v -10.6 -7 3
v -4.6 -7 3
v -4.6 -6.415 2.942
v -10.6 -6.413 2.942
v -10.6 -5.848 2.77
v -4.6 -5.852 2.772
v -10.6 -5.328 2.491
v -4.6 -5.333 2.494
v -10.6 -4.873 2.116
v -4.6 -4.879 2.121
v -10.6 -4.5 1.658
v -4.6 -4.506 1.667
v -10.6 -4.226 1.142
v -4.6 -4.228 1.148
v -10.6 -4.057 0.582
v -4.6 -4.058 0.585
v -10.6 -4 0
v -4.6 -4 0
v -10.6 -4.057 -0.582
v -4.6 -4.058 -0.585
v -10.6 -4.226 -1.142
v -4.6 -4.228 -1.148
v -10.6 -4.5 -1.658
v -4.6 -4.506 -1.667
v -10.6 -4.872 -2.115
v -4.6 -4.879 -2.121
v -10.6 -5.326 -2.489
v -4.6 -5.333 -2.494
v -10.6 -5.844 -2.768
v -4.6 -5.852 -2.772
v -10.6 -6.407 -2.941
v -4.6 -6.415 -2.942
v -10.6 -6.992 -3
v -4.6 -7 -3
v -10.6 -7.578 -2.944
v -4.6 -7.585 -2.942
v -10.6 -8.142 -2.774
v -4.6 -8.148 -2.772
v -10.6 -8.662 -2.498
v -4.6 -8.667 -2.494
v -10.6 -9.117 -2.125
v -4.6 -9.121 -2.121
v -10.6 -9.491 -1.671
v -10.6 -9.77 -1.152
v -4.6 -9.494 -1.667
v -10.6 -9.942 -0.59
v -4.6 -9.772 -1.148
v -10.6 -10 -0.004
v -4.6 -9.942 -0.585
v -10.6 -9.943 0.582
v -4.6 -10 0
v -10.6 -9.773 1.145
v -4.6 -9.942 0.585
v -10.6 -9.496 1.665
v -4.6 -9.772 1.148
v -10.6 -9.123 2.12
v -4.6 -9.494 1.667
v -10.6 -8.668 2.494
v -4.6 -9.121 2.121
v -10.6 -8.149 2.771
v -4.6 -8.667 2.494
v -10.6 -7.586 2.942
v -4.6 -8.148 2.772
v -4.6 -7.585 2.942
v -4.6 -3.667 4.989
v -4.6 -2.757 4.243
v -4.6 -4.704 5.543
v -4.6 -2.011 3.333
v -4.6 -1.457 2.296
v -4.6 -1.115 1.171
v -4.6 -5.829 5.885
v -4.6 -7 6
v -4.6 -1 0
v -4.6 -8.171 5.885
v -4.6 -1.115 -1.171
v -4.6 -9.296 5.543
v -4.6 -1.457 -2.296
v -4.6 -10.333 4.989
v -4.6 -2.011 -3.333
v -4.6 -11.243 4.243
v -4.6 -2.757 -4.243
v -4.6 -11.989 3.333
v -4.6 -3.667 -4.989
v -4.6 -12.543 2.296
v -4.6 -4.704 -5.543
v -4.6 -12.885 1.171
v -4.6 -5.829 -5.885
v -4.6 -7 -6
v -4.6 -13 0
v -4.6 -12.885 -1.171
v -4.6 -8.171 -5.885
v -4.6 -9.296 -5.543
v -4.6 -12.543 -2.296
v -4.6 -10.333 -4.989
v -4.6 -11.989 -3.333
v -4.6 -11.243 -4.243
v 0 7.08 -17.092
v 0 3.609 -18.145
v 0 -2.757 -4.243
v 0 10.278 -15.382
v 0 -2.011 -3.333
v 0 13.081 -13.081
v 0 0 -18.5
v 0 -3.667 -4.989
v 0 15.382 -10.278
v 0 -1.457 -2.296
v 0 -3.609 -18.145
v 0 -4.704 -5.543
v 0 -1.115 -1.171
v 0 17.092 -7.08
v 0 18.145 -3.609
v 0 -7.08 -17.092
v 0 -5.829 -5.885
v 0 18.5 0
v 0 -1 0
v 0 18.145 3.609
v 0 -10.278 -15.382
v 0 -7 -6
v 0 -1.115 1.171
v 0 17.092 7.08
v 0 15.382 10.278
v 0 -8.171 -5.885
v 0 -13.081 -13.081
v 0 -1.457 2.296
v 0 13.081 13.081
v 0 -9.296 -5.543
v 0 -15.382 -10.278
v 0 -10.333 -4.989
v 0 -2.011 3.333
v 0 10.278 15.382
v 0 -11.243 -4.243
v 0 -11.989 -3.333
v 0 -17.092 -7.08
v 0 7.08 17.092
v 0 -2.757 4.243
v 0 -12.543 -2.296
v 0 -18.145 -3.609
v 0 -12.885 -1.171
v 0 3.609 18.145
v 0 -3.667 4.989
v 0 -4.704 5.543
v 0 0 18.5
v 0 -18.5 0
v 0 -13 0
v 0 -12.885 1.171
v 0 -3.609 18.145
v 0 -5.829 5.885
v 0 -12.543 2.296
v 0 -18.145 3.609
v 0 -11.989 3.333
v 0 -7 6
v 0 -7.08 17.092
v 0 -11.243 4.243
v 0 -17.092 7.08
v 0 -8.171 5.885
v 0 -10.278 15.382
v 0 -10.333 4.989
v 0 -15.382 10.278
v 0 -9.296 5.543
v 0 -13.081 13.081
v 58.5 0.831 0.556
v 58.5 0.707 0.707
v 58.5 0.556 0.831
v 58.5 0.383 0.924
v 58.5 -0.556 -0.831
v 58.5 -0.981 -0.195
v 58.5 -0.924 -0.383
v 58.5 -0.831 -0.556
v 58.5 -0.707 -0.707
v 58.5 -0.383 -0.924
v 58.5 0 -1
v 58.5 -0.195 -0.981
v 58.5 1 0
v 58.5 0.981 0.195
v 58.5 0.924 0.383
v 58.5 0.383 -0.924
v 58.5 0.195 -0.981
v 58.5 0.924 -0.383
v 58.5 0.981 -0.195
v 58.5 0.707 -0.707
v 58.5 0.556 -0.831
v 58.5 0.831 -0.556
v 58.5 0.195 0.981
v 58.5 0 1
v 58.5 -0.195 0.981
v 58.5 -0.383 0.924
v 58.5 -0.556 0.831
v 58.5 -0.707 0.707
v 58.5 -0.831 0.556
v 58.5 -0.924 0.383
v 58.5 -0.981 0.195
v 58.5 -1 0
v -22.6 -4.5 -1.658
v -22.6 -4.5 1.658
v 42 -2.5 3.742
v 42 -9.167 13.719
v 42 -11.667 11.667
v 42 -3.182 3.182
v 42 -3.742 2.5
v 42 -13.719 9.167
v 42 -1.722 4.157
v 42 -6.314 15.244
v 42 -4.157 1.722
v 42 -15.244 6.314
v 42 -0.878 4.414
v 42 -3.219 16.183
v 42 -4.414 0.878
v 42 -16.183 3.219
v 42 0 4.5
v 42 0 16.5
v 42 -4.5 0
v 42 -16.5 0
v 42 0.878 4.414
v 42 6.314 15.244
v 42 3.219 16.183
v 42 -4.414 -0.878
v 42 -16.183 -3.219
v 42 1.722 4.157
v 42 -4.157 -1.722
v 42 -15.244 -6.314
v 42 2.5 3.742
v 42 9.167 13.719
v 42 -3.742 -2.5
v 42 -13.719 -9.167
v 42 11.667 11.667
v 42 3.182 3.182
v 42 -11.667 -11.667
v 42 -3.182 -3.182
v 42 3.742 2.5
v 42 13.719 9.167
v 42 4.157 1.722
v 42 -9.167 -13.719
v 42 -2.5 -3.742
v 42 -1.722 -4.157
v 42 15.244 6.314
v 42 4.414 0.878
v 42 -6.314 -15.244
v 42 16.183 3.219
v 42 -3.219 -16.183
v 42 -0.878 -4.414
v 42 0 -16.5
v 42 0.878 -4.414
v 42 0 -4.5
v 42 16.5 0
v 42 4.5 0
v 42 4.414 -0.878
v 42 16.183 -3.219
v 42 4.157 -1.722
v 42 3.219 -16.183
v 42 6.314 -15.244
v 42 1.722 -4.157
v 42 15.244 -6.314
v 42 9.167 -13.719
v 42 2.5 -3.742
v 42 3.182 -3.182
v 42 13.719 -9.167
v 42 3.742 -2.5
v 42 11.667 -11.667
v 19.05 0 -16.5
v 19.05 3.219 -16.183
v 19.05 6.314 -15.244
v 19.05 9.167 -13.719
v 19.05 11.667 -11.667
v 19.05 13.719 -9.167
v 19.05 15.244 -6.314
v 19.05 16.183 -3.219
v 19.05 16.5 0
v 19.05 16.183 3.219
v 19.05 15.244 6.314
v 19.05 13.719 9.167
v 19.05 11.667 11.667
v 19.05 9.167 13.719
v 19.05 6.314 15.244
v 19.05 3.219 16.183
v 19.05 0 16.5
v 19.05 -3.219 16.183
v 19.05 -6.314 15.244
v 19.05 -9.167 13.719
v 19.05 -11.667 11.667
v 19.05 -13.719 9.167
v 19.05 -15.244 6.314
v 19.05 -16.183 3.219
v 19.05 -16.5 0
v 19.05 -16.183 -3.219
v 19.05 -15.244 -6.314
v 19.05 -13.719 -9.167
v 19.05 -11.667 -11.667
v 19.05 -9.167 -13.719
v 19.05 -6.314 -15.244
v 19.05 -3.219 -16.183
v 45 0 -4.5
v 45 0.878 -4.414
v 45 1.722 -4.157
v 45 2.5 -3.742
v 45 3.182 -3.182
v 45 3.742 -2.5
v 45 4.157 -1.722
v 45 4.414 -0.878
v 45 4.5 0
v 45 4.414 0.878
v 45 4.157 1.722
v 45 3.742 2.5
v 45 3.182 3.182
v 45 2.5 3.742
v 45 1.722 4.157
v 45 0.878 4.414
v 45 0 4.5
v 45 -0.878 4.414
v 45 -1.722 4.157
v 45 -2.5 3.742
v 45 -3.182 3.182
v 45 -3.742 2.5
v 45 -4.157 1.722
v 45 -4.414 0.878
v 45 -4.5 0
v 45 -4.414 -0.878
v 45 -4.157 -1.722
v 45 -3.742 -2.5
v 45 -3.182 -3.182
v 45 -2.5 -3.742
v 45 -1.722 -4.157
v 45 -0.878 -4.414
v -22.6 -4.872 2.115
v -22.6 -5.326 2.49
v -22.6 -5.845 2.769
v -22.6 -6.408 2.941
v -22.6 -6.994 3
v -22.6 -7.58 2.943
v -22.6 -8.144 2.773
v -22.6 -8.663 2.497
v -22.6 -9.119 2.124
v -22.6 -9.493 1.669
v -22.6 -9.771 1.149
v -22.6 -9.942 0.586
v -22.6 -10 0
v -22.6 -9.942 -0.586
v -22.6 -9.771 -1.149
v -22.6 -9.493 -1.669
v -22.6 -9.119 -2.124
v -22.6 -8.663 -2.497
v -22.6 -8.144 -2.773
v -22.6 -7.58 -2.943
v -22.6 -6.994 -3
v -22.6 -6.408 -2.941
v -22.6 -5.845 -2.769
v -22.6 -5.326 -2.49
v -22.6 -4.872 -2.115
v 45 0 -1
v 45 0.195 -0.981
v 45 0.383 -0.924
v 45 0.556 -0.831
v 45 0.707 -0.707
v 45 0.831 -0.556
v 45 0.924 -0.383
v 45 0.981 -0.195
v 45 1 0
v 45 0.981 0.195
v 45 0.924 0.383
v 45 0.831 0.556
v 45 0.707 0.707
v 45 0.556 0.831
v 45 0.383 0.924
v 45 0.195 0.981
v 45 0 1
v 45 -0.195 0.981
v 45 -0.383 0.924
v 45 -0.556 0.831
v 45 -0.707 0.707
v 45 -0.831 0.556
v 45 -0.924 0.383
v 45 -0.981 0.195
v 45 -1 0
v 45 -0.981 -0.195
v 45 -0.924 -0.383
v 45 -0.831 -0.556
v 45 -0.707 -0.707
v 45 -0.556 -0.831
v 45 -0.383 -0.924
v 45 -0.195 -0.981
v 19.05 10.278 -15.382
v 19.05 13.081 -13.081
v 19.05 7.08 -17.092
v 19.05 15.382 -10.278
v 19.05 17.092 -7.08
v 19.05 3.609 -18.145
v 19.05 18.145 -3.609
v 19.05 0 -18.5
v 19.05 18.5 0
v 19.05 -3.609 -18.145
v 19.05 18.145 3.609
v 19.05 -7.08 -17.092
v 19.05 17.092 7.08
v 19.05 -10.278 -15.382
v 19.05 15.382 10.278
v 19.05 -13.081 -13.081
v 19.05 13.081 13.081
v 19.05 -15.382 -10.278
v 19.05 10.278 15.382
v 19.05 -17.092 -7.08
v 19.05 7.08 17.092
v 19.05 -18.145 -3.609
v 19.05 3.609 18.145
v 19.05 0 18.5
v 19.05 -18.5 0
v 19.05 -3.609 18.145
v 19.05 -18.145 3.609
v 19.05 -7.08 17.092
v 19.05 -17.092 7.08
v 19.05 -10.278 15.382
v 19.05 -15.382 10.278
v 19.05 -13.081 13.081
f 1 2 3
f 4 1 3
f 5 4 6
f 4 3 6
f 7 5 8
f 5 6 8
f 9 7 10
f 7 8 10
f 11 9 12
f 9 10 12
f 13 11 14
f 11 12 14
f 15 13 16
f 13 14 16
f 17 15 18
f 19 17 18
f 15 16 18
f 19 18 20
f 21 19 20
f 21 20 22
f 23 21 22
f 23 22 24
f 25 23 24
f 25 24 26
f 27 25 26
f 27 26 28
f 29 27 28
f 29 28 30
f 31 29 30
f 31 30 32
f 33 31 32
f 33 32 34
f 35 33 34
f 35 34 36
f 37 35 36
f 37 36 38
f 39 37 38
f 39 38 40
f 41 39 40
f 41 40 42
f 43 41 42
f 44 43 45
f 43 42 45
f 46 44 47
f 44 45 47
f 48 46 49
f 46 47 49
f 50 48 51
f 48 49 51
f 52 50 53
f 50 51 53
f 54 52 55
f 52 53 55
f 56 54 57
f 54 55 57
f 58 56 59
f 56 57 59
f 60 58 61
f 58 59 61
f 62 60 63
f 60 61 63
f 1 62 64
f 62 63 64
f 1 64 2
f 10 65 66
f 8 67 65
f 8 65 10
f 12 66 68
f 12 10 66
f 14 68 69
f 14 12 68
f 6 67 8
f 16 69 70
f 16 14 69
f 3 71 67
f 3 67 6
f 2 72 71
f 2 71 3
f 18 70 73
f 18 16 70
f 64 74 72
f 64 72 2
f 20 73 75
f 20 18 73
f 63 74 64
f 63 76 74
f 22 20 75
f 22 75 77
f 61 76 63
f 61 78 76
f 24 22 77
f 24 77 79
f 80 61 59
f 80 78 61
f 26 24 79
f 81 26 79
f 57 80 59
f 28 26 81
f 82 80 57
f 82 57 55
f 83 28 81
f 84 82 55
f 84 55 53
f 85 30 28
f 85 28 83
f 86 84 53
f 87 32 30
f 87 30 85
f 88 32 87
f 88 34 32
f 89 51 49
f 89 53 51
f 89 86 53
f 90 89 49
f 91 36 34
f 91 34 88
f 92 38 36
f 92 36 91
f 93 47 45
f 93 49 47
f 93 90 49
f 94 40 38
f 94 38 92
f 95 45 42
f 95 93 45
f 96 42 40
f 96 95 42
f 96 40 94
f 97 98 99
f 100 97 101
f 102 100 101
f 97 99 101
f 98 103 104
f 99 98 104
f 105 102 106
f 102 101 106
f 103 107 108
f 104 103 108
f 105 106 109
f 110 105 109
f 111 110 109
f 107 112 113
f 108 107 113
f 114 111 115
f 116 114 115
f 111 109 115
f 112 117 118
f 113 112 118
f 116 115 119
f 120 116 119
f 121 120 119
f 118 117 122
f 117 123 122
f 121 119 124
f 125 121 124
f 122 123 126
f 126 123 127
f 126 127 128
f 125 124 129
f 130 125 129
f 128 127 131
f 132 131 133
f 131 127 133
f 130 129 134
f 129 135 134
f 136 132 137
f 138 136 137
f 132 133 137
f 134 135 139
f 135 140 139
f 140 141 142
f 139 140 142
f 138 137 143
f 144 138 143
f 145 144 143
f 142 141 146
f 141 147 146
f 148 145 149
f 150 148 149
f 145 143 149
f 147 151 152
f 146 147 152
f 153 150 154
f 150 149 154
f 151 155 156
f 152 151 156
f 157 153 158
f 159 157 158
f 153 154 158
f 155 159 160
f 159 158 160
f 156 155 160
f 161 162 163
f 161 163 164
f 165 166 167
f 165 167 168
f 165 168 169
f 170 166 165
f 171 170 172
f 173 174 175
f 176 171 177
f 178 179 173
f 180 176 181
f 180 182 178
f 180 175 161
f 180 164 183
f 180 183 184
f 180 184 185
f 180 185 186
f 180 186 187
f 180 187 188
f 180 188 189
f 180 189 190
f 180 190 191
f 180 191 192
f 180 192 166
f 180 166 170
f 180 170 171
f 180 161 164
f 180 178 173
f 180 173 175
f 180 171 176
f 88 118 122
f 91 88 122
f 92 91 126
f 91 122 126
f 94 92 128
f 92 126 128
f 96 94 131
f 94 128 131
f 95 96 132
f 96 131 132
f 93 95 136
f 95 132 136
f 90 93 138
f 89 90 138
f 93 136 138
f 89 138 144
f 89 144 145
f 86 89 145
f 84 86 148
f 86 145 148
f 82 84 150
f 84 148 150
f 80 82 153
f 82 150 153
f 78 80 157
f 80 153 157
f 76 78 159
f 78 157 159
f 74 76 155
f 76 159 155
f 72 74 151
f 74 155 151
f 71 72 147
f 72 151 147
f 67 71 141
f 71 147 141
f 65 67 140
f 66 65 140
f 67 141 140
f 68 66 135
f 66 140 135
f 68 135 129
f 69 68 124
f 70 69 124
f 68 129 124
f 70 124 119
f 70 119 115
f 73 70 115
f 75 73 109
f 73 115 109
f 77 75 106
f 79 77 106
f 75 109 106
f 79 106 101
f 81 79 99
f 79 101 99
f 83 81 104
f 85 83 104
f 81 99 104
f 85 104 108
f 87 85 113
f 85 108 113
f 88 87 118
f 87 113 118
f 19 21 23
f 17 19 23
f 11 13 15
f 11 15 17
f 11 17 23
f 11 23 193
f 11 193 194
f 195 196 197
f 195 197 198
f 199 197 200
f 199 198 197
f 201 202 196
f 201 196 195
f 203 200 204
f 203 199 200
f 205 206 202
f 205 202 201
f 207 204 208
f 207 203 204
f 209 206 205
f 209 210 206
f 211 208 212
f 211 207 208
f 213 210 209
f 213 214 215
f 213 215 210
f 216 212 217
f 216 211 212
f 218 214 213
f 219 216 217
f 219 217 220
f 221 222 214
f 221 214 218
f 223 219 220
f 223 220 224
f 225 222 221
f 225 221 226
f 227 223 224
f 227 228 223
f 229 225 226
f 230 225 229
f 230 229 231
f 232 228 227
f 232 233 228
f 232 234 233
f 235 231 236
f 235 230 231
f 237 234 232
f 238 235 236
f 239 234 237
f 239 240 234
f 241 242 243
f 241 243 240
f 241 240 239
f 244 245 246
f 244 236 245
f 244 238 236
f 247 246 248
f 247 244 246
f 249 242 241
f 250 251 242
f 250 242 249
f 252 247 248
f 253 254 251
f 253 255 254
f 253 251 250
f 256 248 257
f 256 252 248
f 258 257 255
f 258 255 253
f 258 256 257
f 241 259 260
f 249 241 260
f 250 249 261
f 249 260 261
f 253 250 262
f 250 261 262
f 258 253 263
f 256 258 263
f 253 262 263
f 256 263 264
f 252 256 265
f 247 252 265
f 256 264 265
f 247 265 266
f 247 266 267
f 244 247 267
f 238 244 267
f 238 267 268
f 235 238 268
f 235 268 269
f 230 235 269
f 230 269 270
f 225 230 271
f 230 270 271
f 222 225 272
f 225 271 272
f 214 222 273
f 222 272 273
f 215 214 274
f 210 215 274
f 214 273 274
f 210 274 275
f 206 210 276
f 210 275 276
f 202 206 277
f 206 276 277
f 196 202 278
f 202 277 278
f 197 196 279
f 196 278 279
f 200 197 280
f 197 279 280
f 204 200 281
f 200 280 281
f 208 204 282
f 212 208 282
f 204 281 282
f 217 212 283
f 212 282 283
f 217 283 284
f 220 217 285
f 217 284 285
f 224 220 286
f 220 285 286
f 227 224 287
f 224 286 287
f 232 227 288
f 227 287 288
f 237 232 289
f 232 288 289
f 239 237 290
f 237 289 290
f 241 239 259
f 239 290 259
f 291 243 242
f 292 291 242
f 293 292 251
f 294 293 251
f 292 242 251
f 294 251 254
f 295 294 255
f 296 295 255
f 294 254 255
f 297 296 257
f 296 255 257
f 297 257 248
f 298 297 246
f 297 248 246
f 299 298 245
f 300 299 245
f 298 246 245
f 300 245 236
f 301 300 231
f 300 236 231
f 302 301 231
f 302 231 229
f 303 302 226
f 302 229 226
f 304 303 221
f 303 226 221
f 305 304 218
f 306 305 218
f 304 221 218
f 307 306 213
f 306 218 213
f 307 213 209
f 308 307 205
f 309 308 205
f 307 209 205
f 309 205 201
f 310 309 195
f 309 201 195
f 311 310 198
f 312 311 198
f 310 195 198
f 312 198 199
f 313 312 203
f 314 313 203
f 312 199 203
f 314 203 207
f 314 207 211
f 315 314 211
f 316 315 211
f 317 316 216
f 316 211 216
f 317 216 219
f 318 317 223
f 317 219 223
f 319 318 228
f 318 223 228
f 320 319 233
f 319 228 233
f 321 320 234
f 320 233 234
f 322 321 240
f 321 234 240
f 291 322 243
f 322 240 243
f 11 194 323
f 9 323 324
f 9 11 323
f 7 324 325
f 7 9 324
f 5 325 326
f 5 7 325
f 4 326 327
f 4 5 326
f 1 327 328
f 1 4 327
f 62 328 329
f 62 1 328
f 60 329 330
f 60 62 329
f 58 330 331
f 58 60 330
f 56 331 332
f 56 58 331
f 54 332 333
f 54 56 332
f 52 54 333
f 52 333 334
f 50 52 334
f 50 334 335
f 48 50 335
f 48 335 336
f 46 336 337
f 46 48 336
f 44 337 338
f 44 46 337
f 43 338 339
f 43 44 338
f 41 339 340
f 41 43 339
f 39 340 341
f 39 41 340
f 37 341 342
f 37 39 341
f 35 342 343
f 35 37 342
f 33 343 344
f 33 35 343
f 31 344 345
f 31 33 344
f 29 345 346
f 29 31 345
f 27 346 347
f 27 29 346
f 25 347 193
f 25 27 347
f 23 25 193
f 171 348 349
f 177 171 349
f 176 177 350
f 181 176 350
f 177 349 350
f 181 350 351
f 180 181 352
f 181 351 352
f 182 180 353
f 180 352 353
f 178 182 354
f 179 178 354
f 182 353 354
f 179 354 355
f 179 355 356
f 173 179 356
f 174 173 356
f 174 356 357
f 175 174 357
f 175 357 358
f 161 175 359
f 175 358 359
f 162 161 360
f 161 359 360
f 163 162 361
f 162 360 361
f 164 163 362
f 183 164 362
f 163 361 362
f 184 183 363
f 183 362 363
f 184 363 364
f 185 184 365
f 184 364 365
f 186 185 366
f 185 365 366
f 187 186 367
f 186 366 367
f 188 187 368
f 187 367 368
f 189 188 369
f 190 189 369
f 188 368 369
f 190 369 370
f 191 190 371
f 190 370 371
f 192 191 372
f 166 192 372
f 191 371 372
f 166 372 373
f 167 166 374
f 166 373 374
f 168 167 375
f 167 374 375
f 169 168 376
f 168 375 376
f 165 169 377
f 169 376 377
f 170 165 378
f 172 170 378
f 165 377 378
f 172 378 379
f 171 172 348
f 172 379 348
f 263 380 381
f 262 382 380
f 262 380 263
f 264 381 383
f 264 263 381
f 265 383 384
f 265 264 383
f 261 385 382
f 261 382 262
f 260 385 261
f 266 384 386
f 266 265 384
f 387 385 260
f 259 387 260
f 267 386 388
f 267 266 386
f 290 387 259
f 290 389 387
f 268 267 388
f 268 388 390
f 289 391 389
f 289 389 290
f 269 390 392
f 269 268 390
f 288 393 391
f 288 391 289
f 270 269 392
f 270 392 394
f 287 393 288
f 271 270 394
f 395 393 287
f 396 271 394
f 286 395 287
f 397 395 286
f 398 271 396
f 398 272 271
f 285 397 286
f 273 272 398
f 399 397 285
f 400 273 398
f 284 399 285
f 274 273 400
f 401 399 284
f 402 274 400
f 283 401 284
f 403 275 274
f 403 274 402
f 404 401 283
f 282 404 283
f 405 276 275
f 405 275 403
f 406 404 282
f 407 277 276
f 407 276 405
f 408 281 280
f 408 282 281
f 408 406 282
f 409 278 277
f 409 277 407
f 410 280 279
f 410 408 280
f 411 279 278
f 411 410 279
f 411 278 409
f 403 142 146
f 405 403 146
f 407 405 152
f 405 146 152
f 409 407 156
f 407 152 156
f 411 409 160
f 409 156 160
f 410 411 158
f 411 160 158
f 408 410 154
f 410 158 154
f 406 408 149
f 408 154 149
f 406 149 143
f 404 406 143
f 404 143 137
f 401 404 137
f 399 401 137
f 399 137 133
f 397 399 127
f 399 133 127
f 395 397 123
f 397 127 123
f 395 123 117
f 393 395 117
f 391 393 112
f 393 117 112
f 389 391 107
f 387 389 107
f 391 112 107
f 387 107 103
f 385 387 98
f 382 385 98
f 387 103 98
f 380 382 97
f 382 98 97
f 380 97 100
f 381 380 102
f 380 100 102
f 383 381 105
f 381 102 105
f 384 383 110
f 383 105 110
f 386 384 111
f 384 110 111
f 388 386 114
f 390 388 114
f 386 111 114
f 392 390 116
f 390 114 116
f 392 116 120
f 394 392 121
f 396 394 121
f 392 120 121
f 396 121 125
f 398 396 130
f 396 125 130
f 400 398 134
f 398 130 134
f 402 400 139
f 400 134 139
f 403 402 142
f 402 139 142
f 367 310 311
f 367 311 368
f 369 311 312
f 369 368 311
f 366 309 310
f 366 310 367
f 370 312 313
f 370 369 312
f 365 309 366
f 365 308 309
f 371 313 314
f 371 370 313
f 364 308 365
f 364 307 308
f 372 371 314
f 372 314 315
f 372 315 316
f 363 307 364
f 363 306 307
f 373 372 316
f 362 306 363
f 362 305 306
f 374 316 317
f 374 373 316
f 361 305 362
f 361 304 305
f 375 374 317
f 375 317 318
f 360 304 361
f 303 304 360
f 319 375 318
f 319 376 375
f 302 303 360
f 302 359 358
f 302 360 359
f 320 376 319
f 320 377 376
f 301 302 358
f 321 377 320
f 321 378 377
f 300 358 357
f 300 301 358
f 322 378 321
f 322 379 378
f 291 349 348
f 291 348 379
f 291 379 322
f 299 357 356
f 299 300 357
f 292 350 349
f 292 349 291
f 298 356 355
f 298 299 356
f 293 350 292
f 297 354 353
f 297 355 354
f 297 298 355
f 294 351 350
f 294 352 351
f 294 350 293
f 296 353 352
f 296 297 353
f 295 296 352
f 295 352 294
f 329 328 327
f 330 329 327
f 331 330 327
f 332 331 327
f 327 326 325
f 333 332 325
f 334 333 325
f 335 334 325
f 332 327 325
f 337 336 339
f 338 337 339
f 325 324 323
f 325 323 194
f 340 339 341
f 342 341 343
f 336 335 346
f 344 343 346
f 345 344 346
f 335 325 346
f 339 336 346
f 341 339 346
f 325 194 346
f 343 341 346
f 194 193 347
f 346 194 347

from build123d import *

# Parameters (mm, degrees)
SKETCH1_R           = 18.5
BOSS_EXTRUDE1_DEPTH = 19.05
SKETCH2_R           = 16.5
BOSS_EXTRUDE2_DEPTH = 22.95
SKETCH3_R           = 4.5
BOSS_EXTRUDE3_DEPTH = 3
SKETCH4_R           = 1
BOSS_EXTRUDE4_DEPTH = 13.5
SKETCH5_R           = 6
BOSS_EXTRUDE5_DEPTH = 4.6
SKETCH7_R           = 3
BOSS_EXTRUDE6_DEPTH = 6
BOSS_EXTRUDE7_DEPTH = 12


with BuildPart() as part:
    # Sketch1 → Boss-Extrude1 (new body)
    with BuildSketch(Plane(origin=(0, 0, 0), x_dir=(0, 0, -1), z_dir=(1, 0, 0))):
        with Locations(Location((0, 0, 0), (0, 0, 180))):
            Circle(SKETCH1_R)
    extrude(amount=BOSS_EXTRUDE1_DEPTH)

    # Sketch2 → Boss-Extrude2 (add)
    with BuildSketch(Plane(origin=(19.05, 0, 0), x_dir=(0, 0, -1), z_dir=(1, 0, 0))):
        Circle(SKETCH2_R)
    extrude(amount=BOSS_EXTRUDE2_DEPTH)

    # Sketch3 → Boss-Extrude3 (add)
    with BuildSketch(Plane(origin=(42, 0, 0), x_dir=(0, 0, -1), z_dir=(1, 0, 0))):
        Circle(SKETCH3_R)
    extrude(amount=BOSS_EXTRUDE3_DEPTH)

    # Sketch4 → Boss-Extrude4 (add)
    with BuildSketch(Plane(origin=(45, 0, 0), x_dir=(0, 0, -1), z_dir=(1, 0, 0))):
        Circle(SKETCH4_R)
    extrude(amount=BOSS_EXTRUDE4_DEPTH)

    # Sketch5 → Boss-Extrude5 (add)
    with BuildSketch(Plane.ZY):
        with Locations(Location((0, -7, 0), (0, 0, 180))):
            Circle(SKETCH5_R)
    extrude(amount=BOSS_EXTRUDE5_DEPTH)

    # Sketch7 → Boss-Extrude6 (add)
    with BuildSketch(Plane.ZY.offset(4.6)):
        with Locations((0, -7)):
            Circle(SKETCH7_R)
    extrude(amount=BOSS_EXTRUDE6_DEPTH)

    # Sketch8 → Boss-Extrude7 (add)
    with BuildSketch(Plane.ZY.offset(10.6)):
        with BuildLine():
            Line((-1.658312395, -4.5), (1.658312395, -4.5))
            ThreePointArc((1.658312395, -4.5), (0, -10), (-1.658312395, -4.5))
        make_face()
    extrude(amount=BOSS_EXTRUDE7_DEPTH)


solid = part.part
